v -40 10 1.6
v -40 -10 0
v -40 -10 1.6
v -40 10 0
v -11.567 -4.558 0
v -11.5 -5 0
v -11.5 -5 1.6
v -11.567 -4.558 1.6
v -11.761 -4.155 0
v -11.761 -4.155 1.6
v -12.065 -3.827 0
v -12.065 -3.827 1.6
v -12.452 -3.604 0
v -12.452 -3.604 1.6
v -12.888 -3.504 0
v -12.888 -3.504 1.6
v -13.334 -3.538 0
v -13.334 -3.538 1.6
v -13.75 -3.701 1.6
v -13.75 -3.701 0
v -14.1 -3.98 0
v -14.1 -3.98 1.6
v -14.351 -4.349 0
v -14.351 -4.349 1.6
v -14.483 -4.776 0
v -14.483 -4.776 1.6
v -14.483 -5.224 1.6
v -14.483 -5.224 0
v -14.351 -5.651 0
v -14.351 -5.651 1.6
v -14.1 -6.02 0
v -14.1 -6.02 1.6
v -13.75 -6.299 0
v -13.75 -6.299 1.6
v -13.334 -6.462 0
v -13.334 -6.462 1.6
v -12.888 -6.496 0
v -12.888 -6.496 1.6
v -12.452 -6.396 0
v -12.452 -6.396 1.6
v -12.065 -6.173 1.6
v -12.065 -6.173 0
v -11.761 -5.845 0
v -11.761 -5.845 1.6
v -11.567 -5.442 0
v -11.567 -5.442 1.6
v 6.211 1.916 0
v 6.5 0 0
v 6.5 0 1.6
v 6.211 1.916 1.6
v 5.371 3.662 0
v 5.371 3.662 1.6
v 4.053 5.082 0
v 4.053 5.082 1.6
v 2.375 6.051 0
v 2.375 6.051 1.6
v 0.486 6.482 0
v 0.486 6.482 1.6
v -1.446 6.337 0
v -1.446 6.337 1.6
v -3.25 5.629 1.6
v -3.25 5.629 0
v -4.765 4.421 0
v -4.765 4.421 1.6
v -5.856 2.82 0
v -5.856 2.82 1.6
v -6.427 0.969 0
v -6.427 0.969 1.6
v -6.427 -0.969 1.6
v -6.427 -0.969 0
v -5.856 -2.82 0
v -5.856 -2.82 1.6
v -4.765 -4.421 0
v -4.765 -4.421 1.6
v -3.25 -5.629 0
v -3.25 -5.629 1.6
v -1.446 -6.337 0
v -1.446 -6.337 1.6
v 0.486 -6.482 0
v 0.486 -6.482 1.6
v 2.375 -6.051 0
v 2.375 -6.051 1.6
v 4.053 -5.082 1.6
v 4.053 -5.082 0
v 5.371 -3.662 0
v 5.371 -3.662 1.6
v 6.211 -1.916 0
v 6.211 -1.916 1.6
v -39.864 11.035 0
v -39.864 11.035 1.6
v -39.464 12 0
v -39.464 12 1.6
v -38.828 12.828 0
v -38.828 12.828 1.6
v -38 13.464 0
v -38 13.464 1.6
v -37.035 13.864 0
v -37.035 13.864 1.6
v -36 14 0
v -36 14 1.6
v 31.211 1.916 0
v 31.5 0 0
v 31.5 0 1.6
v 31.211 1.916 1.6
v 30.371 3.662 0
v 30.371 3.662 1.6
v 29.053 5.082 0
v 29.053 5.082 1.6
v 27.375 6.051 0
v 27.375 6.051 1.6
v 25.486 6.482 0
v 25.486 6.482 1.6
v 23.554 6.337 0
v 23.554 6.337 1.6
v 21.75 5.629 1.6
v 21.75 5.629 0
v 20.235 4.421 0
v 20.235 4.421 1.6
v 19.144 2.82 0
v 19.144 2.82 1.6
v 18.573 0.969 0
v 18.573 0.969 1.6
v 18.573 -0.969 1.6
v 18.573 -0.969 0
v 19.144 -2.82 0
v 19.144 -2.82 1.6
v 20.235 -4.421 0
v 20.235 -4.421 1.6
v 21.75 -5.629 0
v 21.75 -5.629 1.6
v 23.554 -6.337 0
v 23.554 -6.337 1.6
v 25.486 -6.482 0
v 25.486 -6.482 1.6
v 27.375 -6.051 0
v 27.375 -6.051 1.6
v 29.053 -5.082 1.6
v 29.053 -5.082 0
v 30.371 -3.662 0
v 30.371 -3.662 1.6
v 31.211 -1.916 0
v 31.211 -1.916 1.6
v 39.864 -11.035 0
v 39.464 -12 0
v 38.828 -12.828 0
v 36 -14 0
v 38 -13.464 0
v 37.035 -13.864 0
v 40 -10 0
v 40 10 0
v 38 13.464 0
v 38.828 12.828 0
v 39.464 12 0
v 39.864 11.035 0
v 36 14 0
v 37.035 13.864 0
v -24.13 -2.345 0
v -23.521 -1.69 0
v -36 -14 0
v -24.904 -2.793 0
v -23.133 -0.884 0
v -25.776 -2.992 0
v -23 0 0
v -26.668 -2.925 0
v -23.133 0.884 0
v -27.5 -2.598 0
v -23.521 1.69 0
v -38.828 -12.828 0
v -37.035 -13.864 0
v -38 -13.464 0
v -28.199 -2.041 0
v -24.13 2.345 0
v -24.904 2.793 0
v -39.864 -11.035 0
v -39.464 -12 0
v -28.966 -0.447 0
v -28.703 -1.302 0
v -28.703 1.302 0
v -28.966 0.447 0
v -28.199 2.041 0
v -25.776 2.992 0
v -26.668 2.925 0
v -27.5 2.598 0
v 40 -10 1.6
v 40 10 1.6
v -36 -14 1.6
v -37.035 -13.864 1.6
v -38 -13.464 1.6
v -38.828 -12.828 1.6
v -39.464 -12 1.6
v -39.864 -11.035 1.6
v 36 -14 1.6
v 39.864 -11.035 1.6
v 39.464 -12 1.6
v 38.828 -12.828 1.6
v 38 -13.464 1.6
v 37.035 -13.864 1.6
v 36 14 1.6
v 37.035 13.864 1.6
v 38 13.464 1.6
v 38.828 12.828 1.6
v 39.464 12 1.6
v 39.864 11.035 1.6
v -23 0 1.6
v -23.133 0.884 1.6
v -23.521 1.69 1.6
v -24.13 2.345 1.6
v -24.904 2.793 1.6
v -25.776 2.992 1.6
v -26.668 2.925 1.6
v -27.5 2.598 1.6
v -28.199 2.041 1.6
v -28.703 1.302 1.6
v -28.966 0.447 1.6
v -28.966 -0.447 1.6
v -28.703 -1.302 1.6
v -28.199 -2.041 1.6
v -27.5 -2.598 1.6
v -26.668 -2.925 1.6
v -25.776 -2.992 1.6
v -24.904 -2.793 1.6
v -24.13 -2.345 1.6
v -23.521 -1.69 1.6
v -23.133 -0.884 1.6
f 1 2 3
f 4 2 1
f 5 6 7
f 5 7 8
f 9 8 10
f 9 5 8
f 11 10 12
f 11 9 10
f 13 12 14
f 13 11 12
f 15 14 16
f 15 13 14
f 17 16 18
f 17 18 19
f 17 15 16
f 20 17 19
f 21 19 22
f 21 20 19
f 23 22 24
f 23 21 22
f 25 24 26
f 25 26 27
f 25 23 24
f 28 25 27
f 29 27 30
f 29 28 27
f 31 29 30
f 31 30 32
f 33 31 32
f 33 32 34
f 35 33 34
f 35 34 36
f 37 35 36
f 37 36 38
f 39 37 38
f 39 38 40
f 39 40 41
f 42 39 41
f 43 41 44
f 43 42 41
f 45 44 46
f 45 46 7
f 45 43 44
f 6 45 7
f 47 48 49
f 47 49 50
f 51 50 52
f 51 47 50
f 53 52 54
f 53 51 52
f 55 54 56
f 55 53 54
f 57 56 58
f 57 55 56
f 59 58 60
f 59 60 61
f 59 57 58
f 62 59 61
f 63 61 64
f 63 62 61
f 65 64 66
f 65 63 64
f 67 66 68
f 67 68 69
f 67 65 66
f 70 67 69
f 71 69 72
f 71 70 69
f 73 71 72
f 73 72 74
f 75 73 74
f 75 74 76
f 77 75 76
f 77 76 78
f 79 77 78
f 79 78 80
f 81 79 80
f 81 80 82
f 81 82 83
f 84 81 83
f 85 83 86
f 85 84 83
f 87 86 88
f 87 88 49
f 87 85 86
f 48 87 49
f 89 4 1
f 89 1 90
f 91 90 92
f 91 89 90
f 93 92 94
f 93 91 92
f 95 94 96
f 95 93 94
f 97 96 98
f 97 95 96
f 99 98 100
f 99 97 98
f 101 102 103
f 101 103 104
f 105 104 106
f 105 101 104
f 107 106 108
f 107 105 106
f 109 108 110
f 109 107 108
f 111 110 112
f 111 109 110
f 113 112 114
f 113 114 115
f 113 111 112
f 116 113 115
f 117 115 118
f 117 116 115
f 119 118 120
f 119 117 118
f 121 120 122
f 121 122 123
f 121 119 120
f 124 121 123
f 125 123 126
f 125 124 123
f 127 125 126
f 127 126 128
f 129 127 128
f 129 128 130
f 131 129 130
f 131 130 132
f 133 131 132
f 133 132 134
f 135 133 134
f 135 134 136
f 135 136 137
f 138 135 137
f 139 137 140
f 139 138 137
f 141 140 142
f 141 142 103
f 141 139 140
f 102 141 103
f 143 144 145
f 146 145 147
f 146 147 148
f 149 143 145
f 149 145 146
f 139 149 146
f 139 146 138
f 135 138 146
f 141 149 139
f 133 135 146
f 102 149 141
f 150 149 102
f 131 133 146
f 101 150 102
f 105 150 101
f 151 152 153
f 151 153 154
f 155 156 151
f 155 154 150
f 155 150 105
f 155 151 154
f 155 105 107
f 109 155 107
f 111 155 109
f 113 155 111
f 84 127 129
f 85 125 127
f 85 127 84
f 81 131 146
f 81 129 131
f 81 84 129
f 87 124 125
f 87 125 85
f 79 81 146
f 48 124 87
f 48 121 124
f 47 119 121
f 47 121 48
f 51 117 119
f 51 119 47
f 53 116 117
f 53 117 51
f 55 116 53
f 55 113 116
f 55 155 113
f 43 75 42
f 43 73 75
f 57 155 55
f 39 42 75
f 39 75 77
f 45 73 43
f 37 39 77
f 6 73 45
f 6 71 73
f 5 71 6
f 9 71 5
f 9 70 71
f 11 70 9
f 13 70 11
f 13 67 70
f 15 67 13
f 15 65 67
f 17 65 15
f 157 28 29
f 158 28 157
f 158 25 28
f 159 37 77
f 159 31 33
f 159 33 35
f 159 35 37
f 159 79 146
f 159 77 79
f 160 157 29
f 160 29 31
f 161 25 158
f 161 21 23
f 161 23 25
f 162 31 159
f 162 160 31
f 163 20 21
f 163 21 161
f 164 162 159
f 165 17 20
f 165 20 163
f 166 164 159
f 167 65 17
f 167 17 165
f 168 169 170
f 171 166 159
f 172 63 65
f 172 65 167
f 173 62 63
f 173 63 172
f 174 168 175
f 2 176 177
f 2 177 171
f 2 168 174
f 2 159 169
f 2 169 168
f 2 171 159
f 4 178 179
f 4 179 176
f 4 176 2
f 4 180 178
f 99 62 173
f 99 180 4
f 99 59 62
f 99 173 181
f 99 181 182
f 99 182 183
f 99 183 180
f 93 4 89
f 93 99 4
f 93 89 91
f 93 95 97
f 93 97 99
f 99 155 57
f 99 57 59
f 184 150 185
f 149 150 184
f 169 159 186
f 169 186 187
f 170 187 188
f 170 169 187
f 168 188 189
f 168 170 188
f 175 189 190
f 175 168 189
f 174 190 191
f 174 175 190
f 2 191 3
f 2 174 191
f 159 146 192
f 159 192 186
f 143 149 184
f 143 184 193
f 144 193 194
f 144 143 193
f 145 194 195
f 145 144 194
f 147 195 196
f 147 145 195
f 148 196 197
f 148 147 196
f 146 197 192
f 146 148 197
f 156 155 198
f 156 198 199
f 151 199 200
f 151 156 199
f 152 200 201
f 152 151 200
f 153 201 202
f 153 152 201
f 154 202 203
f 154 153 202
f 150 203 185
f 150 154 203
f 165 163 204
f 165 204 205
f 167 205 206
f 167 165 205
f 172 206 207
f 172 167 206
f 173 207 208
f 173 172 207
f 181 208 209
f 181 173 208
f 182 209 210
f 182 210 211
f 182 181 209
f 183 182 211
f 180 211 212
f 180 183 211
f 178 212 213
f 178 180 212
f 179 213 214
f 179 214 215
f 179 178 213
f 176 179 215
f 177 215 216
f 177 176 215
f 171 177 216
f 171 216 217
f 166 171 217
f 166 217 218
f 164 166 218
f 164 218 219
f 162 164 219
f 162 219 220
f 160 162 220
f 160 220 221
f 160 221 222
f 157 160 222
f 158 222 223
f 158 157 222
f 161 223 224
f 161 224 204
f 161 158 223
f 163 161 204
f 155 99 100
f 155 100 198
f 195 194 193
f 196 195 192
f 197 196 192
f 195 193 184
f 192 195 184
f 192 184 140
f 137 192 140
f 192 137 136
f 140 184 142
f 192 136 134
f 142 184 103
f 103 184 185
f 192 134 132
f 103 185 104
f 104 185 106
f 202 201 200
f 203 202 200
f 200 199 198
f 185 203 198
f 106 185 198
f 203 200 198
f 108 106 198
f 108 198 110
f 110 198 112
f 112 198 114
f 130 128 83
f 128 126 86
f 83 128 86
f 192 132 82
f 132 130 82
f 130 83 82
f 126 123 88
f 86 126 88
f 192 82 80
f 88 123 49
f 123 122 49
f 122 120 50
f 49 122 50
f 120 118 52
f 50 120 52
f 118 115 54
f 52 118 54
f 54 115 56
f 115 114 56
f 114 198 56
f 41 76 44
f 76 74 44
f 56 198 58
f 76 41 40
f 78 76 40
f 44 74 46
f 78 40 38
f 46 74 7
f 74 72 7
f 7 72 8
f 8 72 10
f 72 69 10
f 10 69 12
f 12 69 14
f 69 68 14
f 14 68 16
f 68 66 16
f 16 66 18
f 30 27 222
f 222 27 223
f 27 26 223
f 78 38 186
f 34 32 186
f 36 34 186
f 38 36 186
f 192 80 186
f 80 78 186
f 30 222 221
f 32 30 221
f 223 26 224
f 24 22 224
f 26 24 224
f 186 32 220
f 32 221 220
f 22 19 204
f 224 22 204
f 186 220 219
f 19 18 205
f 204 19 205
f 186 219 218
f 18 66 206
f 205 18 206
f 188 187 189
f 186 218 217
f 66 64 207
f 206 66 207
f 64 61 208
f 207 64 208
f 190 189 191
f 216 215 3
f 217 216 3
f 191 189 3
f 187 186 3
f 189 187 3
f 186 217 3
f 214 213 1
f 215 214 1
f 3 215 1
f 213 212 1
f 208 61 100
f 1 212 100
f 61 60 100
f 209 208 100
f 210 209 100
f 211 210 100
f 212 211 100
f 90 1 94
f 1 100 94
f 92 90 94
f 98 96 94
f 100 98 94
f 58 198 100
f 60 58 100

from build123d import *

# Parameters (mm, degrees)
SKETCH1_R           = 3
SKETCH1_R_2         = 6.5
SKETCH1_R_3         = 1.5
BOSS_EXTRUDE1_DEPTH = 1.6


with BuildPart() as part:
    # Sketch1 → Boss-Extrude1 (new body)
    with BuildSketch(Plane.XY):
        with BuildLine():
            Line((-36, 14), (36, 14))
            ThreePointArc((36, 14), (38.828427125, 12.828427125), (40, 10))
            Line((40, 10), (40, -10))
            ThreePointArc((40, -10), (38.828427125, -12.828427125), (36, -14))
            Line((36, -14), (-36, -14))
            ThreePointArc((-36, -14), (-38.828427125, -12.828427125), (-40, -10))
            Line((-40, -10), (-40, 10))
            ThreePointArc((-40, 10), (-38.828427125, 12.828427125), (-36, 14))
        make_face()
        with Locations((-26, 0)):
            Circle(SKETCH1_R, mode=Mode.SUBTRACT)
        Circle(SKETCH1_R_2, mode=Mode.SUBTRACT)
        with Locations((25, 0)):
            Circle(SKETCH1_R_2, mode=Mode.SUBTRACT)
        with Locations((-13, -5)):
            Circle(SKETCH1_R_3, mode=Mode.SUBTRACT)
    extrude(amount=BOSS_EXTRUDE1_DEPTH)


solid = part.part
